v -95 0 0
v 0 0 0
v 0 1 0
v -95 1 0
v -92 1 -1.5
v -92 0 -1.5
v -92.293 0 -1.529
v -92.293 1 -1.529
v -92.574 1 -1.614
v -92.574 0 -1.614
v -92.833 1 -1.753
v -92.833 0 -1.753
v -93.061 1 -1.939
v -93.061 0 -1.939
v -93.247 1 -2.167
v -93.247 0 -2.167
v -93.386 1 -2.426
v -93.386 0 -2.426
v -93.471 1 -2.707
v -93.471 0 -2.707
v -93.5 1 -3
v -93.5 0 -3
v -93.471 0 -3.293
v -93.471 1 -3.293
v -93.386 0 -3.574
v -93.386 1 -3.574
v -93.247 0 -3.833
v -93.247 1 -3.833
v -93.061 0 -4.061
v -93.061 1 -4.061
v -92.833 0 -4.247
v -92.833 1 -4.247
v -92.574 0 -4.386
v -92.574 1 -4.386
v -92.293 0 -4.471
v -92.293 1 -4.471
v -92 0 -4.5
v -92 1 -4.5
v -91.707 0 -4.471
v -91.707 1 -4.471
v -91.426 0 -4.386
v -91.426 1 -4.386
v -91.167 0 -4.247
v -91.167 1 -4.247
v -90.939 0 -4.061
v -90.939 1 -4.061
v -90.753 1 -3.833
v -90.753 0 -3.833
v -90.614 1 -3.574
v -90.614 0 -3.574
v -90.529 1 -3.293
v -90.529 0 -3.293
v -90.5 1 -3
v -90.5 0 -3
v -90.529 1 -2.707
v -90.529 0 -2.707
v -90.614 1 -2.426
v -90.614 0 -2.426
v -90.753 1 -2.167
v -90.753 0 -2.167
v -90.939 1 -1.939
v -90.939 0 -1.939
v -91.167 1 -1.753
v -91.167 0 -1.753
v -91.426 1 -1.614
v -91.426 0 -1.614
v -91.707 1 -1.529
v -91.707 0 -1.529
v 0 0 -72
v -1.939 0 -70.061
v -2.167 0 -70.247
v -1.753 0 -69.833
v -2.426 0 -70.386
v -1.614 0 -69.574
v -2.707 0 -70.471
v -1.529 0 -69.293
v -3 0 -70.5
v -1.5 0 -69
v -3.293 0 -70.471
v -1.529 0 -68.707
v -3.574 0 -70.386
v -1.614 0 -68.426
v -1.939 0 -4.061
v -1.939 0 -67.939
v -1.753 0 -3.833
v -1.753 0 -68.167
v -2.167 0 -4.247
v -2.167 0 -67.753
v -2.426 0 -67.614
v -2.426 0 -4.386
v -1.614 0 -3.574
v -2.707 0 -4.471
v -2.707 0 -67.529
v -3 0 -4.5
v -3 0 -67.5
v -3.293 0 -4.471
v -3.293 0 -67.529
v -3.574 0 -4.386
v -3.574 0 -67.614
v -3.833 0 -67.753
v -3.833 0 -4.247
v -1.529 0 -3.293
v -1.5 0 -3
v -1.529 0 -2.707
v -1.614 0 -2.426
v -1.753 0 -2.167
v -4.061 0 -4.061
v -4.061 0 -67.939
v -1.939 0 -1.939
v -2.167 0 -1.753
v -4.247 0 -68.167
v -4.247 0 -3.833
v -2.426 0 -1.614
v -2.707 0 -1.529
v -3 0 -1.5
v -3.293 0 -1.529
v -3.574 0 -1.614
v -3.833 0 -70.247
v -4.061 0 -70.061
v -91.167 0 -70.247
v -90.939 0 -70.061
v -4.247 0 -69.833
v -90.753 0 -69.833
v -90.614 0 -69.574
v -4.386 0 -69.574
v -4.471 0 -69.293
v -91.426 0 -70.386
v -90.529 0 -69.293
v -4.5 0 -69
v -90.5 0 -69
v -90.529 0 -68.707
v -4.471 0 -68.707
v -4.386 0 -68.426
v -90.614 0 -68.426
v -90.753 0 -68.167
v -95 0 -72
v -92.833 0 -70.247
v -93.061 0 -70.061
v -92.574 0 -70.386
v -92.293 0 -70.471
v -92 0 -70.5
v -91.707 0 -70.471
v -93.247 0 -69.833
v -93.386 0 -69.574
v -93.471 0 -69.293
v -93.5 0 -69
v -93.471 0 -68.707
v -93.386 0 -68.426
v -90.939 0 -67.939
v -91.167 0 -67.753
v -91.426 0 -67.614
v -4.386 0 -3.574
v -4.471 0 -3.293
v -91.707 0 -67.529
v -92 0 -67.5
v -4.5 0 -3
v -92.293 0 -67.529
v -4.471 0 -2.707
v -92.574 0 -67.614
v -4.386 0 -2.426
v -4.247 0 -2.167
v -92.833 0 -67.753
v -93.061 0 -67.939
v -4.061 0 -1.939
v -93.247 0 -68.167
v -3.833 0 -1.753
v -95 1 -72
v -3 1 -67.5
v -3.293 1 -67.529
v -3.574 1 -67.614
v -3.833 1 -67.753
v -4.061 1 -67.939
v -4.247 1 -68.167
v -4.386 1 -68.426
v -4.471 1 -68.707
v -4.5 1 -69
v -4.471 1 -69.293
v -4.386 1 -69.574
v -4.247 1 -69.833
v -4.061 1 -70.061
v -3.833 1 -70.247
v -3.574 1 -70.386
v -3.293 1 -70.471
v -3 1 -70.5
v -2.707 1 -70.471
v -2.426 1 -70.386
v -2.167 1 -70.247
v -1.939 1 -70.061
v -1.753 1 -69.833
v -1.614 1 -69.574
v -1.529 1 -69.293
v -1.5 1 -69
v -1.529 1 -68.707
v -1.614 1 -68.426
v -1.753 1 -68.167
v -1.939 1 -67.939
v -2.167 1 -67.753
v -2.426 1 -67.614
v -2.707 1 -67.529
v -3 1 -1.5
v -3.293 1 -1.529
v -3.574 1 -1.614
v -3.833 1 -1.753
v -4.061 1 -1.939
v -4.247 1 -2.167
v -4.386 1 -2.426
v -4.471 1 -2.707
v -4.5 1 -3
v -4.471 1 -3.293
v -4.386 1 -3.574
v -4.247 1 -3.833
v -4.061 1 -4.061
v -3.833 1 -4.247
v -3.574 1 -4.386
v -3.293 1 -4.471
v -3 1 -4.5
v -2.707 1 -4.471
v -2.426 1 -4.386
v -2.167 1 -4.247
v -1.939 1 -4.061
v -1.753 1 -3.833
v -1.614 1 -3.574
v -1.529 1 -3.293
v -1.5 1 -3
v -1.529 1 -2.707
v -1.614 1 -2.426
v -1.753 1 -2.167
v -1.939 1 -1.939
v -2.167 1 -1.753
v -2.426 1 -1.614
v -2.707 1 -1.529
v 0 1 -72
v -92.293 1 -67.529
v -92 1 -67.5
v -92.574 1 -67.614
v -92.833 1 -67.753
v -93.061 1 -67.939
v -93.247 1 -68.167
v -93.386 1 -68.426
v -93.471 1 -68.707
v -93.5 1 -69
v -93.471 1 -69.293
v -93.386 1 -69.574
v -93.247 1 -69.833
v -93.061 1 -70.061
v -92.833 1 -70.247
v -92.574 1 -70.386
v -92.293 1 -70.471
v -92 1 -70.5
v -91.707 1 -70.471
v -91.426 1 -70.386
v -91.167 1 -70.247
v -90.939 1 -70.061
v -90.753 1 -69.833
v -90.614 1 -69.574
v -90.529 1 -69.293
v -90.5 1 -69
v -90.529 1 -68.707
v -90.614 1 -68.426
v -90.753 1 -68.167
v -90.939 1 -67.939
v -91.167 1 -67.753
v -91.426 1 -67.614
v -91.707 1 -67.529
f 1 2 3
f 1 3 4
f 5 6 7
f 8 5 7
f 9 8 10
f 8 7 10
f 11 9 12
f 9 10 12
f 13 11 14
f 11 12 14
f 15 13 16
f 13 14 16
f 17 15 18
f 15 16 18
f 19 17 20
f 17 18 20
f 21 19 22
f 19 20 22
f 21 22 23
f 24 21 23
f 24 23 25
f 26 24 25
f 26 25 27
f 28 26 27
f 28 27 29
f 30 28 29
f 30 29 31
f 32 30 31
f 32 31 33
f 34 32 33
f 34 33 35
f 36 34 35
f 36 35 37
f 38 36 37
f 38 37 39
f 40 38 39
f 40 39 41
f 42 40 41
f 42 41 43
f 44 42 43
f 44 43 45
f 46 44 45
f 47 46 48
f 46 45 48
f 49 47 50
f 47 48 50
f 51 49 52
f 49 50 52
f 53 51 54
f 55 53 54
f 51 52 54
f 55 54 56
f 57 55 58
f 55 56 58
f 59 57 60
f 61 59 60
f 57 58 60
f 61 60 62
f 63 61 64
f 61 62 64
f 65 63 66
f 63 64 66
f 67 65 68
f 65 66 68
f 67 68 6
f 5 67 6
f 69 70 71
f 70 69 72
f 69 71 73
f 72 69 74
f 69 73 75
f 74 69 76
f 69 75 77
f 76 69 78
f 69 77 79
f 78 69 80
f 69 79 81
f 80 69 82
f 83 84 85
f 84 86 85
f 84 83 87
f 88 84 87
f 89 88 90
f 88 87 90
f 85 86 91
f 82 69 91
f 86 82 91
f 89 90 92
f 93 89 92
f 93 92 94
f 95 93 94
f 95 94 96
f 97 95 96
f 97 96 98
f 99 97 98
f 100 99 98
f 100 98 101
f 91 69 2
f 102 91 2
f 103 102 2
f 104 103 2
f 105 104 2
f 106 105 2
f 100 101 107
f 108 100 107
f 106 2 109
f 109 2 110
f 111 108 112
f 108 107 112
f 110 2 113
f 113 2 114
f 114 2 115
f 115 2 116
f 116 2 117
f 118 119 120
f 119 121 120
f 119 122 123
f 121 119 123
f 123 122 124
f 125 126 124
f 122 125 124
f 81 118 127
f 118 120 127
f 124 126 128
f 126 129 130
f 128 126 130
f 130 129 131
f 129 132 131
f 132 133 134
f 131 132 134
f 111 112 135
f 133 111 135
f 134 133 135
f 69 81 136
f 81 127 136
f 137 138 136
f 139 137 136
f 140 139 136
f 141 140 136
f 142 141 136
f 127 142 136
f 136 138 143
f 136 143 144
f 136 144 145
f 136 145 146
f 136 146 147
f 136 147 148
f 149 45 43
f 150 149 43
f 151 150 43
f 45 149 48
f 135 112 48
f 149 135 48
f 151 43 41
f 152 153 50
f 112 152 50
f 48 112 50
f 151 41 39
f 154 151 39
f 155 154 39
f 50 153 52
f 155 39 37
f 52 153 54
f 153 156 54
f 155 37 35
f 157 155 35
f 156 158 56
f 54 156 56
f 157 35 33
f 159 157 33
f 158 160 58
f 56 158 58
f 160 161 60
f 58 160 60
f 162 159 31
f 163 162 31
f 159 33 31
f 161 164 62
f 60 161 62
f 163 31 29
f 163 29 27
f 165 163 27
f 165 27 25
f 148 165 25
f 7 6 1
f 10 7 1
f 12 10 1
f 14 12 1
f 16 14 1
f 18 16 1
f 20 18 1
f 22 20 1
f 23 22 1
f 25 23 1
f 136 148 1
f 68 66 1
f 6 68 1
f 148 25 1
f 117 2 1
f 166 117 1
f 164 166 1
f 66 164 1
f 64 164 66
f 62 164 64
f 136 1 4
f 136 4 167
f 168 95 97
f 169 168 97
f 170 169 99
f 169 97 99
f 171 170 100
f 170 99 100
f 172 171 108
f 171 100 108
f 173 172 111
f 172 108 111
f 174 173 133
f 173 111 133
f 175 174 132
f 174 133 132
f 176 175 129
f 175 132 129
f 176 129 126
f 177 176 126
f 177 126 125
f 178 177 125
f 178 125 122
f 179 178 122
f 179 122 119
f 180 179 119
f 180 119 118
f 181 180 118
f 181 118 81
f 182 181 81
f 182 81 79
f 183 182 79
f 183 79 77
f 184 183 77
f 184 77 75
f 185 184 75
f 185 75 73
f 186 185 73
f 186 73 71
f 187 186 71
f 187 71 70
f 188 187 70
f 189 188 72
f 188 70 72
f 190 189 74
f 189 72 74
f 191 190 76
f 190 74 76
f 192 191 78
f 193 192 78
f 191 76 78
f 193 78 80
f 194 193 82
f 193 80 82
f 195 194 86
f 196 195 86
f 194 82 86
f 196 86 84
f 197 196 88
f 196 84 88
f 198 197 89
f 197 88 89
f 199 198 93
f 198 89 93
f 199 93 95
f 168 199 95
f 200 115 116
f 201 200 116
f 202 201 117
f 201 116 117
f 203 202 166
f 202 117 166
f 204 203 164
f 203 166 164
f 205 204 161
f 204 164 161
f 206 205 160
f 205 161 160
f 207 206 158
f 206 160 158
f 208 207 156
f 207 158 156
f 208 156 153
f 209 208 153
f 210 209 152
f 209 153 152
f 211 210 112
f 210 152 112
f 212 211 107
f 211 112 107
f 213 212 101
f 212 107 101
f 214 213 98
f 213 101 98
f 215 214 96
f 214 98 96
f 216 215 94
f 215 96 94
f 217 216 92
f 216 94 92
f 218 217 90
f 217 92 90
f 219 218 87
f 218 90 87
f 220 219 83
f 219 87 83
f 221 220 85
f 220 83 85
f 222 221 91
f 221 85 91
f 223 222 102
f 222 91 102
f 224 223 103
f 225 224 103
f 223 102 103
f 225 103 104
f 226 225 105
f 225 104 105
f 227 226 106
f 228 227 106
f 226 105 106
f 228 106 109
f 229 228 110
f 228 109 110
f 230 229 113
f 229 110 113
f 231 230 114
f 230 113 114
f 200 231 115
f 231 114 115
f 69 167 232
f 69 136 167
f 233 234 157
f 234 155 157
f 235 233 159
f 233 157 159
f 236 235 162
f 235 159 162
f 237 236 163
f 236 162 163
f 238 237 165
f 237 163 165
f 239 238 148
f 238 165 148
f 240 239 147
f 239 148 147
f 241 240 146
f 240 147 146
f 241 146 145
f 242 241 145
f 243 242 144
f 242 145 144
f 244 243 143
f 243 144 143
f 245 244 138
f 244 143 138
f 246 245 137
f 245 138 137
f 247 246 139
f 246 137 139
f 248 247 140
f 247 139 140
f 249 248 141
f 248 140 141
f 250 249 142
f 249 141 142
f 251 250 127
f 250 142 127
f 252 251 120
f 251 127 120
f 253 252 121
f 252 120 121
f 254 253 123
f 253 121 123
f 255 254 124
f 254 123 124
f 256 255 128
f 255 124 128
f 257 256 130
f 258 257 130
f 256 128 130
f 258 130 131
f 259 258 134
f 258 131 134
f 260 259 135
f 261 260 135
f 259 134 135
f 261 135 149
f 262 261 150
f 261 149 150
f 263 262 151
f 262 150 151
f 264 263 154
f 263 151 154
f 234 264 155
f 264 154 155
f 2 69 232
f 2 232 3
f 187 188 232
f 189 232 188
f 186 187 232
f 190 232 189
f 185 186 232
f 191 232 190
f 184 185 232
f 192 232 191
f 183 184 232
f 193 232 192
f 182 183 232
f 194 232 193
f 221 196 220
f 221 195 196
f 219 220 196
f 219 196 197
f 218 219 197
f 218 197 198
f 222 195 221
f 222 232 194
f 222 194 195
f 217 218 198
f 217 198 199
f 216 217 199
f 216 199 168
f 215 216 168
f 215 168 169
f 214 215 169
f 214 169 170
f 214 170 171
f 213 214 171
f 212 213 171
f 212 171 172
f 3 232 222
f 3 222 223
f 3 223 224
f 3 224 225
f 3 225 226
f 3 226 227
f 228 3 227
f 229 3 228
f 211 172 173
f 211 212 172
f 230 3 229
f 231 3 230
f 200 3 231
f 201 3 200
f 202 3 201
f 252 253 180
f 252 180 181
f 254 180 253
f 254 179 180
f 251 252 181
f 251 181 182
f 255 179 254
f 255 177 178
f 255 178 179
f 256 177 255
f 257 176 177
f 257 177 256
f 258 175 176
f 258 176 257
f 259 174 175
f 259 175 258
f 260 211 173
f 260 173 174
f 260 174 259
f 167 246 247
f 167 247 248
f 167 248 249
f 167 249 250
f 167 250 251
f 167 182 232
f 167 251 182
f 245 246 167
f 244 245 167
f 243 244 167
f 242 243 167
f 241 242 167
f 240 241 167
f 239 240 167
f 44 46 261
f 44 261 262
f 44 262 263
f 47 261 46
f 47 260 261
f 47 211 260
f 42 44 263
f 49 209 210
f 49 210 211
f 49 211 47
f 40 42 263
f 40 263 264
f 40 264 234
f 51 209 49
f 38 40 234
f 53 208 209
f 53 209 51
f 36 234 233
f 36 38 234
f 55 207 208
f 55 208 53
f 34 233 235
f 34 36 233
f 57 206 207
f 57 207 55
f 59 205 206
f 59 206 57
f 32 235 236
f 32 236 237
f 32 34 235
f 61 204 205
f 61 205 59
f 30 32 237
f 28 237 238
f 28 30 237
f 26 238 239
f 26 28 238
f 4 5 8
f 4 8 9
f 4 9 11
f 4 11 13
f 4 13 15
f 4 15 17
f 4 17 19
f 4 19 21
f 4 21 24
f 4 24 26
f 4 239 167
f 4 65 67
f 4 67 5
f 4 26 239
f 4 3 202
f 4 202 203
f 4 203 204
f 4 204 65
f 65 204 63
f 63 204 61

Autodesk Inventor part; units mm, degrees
ref_plane "YZ Plane" through (0, 0, 0) normal (1, 0, 0) x (0, 1, 0)
ref_plane "XZ Plane" through (0, 0, 0) normal (0, 1, 0) x (-1, 0, 0)
ref_plane "XY Plane" through (0, 0, 0) normal (0, 0, 1) x (1, 0, 0)
sketch "スケッチ1" plane through (0, 0, 0) normal (0, 1, 0) x (-1, 0, 0)
  line L0 (0, 0) -> (95, 0)
  line L1 (95, 0) -> (95, -72)
  line L2 (95, -72) -> (0, -72)
  line L3 (0, -72) -> (0, 0)
  dimension "d0" = 95
  dimension "d1" = 72
extrude "押し出し1" add sketch "スケッチ1" along normal blind 1
hole "穴1" at (-92, 1, -3) direction (0, -1, 0) diameter 3 end through all
hole "穴2" at (-92, 1, -69) direction (0, -1, 0) diameter 3 end through all
hole "穴3" at (-3, 1, -3) direction (0, -1, 0) diameter 3 end through all
hole "穴4" at (-3, 1, -69) direction (0, -1, 0) diameter 3 end through all
properties part number "基板"
